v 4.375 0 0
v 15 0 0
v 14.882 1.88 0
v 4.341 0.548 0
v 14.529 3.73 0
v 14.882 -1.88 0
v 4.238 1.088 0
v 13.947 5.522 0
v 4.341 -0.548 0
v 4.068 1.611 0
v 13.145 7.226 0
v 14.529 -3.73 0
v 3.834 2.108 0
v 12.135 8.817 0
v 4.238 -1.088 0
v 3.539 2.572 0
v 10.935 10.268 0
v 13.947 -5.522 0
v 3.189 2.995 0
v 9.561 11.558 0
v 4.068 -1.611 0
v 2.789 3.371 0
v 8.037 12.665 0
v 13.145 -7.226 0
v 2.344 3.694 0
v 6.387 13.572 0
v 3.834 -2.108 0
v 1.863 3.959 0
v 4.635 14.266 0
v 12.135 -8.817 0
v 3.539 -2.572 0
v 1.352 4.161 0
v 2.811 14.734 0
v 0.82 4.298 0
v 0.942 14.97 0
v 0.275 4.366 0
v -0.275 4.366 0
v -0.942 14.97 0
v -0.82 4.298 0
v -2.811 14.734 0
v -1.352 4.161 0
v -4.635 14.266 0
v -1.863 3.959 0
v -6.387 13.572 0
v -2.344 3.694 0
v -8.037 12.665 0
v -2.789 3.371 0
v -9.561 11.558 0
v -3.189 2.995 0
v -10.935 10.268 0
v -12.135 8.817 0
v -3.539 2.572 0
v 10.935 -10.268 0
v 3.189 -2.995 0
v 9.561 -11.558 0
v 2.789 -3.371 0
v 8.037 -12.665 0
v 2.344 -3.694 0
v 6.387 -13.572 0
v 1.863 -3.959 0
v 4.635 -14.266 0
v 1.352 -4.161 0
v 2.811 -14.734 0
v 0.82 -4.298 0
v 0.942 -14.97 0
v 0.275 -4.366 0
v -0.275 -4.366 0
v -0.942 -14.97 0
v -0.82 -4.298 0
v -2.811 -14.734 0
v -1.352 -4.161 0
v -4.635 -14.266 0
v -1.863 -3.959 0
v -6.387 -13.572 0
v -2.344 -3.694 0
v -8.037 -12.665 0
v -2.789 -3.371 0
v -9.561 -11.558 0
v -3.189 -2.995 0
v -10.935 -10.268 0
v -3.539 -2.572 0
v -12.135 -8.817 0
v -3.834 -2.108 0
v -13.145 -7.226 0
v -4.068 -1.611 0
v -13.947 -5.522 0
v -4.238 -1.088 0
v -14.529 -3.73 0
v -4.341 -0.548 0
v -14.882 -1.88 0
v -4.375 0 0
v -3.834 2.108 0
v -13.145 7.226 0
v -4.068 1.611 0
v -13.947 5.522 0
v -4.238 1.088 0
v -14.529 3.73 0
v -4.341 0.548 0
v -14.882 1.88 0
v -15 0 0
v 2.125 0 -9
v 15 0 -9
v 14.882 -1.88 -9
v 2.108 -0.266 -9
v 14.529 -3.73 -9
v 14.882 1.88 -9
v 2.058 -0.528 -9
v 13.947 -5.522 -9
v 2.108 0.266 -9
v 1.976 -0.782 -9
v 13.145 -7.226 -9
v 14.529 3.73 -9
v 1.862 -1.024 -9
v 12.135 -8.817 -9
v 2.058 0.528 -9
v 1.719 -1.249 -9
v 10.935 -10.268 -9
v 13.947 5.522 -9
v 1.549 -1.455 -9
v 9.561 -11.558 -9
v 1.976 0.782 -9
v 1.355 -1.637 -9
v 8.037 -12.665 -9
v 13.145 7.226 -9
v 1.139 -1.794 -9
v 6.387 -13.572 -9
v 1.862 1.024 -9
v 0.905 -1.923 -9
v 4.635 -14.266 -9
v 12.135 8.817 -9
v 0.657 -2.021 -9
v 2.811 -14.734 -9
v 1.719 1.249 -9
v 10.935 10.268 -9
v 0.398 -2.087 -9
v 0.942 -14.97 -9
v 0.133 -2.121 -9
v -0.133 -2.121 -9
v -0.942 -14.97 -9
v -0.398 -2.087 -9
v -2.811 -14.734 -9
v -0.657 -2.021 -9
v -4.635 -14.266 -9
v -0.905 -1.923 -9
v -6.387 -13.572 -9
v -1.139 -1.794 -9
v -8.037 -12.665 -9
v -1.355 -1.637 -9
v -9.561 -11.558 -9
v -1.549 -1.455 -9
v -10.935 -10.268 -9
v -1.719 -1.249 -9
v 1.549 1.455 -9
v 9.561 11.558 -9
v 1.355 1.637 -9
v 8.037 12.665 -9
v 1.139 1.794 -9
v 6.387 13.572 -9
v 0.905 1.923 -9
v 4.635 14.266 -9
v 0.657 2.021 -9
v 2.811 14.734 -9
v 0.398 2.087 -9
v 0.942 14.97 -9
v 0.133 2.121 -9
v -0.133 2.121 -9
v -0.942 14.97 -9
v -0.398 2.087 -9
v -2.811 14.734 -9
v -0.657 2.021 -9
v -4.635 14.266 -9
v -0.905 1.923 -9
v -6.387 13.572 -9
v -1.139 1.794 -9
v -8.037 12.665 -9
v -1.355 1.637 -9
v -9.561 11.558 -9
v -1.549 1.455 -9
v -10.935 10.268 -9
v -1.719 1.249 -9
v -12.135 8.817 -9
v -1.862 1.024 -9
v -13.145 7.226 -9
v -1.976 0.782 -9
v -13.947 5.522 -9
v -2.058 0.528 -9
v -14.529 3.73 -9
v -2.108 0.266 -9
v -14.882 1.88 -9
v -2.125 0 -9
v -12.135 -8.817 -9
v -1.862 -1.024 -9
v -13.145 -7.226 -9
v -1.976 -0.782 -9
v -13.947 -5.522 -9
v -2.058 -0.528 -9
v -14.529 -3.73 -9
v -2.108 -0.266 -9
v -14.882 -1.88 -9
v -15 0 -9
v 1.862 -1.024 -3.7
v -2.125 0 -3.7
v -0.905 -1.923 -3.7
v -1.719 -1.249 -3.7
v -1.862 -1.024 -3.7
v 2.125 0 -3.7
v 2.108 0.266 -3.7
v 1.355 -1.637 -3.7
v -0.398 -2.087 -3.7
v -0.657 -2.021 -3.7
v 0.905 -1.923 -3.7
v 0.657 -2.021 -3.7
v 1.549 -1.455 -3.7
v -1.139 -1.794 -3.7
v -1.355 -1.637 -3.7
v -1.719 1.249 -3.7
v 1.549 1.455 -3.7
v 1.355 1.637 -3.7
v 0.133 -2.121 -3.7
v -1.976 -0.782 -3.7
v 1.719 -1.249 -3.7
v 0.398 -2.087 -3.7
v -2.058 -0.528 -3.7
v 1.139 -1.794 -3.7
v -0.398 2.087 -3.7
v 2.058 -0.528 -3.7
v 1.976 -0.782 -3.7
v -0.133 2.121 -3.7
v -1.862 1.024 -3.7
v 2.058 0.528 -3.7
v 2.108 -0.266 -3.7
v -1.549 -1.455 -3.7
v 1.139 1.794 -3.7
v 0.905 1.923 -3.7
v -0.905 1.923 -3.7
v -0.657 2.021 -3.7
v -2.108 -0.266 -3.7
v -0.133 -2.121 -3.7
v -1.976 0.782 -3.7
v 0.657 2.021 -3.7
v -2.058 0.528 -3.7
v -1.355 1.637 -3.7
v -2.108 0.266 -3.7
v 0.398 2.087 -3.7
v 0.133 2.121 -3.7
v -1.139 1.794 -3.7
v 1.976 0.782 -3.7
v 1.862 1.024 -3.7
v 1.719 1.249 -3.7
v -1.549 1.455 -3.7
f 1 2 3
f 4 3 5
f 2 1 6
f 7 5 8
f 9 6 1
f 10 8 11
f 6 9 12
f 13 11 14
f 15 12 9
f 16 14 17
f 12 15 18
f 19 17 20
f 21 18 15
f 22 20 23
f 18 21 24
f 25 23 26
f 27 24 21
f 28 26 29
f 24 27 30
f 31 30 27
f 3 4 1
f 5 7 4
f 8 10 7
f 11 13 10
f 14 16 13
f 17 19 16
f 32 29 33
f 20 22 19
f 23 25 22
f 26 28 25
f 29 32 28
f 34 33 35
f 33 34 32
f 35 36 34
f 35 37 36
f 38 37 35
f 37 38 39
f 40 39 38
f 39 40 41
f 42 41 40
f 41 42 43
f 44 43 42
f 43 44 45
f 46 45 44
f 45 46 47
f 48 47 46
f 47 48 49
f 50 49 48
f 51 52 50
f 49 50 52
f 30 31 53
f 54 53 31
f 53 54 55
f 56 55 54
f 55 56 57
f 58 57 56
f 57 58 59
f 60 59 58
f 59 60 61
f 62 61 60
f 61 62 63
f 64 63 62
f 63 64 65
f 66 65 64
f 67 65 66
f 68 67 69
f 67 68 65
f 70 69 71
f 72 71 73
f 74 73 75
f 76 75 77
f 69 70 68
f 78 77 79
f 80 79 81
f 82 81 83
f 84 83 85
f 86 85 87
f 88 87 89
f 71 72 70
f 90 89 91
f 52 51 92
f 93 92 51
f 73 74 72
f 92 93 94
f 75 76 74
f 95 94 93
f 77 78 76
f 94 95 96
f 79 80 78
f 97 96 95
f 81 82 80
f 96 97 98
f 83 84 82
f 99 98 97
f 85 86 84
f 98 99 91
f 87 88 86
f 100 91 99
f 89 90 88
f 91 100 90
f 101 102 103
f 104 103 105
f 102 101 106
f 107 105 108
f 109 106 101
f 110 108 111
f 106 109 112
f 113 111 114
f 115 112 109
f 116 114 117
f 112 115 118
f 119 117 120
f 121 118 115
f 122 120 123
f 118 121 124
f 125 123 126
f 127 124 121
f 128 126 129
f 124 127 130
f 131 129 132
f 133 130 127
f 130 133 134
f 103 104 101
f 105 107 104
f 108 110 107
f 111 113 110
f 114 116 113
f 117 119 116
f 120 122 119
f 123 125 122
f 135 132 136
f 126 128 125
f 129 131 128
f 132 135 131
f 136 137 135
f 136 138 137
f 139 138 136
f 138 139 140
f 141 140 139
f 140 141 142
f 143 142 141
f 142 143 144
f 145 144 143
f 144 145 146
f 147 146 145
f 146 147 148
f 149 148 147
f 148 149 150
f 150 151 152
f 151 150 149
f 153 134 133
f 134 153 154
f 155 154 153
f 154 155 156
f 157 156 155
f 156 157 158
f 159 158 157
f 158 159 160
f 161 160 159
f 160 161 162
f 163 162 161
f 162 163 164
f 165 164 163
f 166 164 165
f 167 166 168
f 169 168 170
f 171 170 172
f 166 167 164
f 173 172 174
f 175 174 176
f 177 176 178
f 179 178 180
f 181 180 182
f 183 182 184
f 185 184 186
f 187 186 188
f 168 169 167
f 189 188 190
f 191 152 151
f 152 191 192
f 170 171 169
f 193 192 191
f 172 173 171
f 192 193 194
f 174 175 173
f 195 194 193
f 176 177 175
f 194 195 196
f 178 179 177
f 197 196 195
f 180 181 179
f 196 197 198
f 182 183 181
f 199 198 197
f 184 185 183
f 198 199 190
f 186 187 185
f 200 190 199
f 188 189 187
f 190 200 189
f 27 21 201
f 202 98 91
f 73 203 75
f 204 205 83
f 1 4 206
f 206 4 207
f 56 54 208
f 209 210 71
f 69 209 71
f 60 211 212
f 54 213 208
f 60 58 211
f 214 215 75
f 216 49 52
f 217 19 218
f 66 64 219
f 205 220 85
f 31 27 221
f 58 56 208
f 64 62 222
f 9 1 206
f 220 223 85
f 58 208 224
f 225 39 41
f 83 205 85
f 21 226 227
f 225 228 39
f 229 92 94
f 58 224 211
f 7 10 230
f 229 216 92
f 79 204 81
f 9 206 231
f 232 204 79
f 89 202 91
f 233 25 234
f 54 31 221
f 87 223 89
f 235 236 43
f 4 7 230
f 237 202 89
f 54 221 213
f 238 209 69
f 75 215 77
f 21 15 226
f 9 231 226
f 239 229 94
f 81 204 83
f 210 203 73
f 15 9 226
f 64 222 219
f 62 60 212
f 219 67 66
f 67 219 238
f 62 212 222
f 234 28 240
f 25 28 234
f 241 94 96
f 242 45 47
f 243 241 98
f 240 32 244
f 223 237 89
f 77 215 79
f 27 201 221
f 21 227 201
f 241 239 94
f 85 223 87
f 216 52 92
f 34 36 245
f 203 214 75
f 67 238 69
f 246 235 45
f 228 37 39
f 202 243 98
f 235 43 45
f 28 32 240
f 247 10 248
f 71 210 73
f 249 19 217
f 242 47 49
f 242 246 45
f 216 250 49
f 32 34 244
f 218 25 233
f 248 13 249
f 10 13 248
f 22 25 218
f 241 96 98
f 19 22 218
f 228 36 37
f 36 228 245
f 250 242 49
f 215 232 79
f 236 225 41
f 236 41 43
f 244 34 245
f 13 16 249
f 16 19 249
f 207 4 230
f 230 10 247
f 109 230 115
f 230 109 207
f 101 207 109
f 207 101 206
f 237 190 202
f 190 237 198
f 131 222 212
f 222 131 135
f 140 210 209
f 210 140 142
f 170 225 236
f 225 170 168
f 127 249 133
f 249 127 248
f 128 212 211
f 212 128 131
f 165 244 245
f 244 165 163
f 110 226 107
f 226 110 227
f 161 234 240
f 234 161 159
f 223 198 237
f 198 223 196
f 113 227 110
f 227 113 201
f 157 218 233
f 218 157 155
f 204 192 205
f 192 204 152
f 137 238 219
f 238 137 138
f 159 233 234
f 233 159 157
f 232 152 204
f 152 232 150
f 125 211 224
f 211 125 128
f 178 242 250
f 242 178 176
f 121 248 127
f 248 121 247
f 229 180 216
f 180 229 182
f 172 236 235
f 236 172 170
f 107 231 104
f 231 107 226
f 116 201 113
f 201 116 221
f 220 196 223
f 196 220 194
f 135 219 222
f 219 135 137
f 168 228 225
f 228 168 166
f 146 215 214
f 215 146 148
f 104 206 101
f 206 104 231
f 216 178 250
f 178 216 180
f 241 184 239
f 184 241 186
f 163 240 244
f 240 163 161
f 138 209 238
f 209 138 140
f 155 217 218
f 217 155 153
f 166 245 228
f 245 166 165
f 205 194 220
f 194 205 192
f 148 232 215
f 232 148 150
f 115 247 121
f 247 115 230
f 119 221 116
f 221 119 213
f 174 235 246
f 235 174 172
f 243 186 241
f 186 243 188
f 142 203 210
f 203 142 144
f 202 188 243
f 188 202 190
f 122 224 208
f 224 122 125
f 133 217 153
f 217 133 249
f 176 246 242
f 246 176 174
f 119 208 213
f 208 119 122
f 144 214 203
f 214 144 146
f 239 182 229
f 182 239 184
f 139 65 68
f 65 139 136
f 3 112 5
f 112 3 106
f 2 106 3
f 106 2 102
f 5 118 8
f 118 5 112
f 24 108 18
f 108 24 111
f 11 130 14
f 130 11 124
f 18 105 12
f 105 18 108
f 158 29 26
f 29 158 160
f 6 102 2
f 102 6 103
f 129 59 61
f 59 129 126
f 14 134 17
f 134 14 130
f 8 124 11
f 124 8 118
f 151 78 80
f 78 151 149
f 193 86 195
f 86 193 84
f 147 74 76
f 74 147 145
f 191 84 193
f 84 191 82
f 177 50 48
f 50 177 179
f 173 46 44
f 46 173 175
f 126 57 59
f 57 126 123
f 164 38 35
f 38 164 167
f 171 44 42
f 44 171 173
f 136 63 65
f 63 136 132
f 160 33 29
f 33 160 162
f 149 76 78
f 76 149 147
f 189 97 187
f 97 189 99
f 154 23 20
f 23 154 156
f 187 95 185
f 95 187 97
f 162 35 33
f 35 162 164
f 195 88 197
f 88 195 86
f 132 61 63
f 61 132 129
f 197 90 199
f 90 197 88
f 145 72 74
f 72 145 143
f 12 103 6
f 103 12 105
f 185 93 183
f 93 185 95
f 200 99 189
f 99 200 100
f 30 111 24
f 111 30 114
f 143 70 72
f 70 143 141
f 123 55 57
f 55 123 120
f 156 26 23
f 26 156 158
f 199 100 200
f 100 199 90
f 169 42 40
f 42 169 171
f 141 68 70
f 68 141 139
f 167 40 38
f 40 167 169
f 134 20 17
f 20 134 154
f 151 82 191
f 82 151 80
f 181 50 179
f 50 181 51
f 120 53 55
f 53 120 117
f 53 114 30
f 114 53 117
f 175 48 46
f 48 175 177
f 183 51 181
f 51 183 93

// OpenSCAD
$fn = 50;


difference() {
	union() {
		translate(v = [0, 0, -9.0000000000]) {
			cylinder(h = 9, r = 15.0000000000);
		}
	}
	union() {
		translate(v = [0, 0, 0]) {
			rotate(a = [0, 0, 0]) {
				difference() {
					union() {
						#translate(v = [0, 0, -9.0000000000]) {
							cylinder(h = 9, r = 2.0000000000);
						}
						#translate(v = [0, 0, -3.7000000000]) {
							cylinder(h = 3.7000000000, r1 = 2.1250000000, r2 = 4.3750000000);
						}
						#translate(v = [0, 0, -9.0000000000]) {
							cylinder(h = 9, r = 2.1250000000);
						}
						#translate(v = [0, 0, -9.0000000000]) {
							cylinder(h = 9, r = 2.0000000000);
						}
					}
					union();
				}
			}
		}
	}
}
